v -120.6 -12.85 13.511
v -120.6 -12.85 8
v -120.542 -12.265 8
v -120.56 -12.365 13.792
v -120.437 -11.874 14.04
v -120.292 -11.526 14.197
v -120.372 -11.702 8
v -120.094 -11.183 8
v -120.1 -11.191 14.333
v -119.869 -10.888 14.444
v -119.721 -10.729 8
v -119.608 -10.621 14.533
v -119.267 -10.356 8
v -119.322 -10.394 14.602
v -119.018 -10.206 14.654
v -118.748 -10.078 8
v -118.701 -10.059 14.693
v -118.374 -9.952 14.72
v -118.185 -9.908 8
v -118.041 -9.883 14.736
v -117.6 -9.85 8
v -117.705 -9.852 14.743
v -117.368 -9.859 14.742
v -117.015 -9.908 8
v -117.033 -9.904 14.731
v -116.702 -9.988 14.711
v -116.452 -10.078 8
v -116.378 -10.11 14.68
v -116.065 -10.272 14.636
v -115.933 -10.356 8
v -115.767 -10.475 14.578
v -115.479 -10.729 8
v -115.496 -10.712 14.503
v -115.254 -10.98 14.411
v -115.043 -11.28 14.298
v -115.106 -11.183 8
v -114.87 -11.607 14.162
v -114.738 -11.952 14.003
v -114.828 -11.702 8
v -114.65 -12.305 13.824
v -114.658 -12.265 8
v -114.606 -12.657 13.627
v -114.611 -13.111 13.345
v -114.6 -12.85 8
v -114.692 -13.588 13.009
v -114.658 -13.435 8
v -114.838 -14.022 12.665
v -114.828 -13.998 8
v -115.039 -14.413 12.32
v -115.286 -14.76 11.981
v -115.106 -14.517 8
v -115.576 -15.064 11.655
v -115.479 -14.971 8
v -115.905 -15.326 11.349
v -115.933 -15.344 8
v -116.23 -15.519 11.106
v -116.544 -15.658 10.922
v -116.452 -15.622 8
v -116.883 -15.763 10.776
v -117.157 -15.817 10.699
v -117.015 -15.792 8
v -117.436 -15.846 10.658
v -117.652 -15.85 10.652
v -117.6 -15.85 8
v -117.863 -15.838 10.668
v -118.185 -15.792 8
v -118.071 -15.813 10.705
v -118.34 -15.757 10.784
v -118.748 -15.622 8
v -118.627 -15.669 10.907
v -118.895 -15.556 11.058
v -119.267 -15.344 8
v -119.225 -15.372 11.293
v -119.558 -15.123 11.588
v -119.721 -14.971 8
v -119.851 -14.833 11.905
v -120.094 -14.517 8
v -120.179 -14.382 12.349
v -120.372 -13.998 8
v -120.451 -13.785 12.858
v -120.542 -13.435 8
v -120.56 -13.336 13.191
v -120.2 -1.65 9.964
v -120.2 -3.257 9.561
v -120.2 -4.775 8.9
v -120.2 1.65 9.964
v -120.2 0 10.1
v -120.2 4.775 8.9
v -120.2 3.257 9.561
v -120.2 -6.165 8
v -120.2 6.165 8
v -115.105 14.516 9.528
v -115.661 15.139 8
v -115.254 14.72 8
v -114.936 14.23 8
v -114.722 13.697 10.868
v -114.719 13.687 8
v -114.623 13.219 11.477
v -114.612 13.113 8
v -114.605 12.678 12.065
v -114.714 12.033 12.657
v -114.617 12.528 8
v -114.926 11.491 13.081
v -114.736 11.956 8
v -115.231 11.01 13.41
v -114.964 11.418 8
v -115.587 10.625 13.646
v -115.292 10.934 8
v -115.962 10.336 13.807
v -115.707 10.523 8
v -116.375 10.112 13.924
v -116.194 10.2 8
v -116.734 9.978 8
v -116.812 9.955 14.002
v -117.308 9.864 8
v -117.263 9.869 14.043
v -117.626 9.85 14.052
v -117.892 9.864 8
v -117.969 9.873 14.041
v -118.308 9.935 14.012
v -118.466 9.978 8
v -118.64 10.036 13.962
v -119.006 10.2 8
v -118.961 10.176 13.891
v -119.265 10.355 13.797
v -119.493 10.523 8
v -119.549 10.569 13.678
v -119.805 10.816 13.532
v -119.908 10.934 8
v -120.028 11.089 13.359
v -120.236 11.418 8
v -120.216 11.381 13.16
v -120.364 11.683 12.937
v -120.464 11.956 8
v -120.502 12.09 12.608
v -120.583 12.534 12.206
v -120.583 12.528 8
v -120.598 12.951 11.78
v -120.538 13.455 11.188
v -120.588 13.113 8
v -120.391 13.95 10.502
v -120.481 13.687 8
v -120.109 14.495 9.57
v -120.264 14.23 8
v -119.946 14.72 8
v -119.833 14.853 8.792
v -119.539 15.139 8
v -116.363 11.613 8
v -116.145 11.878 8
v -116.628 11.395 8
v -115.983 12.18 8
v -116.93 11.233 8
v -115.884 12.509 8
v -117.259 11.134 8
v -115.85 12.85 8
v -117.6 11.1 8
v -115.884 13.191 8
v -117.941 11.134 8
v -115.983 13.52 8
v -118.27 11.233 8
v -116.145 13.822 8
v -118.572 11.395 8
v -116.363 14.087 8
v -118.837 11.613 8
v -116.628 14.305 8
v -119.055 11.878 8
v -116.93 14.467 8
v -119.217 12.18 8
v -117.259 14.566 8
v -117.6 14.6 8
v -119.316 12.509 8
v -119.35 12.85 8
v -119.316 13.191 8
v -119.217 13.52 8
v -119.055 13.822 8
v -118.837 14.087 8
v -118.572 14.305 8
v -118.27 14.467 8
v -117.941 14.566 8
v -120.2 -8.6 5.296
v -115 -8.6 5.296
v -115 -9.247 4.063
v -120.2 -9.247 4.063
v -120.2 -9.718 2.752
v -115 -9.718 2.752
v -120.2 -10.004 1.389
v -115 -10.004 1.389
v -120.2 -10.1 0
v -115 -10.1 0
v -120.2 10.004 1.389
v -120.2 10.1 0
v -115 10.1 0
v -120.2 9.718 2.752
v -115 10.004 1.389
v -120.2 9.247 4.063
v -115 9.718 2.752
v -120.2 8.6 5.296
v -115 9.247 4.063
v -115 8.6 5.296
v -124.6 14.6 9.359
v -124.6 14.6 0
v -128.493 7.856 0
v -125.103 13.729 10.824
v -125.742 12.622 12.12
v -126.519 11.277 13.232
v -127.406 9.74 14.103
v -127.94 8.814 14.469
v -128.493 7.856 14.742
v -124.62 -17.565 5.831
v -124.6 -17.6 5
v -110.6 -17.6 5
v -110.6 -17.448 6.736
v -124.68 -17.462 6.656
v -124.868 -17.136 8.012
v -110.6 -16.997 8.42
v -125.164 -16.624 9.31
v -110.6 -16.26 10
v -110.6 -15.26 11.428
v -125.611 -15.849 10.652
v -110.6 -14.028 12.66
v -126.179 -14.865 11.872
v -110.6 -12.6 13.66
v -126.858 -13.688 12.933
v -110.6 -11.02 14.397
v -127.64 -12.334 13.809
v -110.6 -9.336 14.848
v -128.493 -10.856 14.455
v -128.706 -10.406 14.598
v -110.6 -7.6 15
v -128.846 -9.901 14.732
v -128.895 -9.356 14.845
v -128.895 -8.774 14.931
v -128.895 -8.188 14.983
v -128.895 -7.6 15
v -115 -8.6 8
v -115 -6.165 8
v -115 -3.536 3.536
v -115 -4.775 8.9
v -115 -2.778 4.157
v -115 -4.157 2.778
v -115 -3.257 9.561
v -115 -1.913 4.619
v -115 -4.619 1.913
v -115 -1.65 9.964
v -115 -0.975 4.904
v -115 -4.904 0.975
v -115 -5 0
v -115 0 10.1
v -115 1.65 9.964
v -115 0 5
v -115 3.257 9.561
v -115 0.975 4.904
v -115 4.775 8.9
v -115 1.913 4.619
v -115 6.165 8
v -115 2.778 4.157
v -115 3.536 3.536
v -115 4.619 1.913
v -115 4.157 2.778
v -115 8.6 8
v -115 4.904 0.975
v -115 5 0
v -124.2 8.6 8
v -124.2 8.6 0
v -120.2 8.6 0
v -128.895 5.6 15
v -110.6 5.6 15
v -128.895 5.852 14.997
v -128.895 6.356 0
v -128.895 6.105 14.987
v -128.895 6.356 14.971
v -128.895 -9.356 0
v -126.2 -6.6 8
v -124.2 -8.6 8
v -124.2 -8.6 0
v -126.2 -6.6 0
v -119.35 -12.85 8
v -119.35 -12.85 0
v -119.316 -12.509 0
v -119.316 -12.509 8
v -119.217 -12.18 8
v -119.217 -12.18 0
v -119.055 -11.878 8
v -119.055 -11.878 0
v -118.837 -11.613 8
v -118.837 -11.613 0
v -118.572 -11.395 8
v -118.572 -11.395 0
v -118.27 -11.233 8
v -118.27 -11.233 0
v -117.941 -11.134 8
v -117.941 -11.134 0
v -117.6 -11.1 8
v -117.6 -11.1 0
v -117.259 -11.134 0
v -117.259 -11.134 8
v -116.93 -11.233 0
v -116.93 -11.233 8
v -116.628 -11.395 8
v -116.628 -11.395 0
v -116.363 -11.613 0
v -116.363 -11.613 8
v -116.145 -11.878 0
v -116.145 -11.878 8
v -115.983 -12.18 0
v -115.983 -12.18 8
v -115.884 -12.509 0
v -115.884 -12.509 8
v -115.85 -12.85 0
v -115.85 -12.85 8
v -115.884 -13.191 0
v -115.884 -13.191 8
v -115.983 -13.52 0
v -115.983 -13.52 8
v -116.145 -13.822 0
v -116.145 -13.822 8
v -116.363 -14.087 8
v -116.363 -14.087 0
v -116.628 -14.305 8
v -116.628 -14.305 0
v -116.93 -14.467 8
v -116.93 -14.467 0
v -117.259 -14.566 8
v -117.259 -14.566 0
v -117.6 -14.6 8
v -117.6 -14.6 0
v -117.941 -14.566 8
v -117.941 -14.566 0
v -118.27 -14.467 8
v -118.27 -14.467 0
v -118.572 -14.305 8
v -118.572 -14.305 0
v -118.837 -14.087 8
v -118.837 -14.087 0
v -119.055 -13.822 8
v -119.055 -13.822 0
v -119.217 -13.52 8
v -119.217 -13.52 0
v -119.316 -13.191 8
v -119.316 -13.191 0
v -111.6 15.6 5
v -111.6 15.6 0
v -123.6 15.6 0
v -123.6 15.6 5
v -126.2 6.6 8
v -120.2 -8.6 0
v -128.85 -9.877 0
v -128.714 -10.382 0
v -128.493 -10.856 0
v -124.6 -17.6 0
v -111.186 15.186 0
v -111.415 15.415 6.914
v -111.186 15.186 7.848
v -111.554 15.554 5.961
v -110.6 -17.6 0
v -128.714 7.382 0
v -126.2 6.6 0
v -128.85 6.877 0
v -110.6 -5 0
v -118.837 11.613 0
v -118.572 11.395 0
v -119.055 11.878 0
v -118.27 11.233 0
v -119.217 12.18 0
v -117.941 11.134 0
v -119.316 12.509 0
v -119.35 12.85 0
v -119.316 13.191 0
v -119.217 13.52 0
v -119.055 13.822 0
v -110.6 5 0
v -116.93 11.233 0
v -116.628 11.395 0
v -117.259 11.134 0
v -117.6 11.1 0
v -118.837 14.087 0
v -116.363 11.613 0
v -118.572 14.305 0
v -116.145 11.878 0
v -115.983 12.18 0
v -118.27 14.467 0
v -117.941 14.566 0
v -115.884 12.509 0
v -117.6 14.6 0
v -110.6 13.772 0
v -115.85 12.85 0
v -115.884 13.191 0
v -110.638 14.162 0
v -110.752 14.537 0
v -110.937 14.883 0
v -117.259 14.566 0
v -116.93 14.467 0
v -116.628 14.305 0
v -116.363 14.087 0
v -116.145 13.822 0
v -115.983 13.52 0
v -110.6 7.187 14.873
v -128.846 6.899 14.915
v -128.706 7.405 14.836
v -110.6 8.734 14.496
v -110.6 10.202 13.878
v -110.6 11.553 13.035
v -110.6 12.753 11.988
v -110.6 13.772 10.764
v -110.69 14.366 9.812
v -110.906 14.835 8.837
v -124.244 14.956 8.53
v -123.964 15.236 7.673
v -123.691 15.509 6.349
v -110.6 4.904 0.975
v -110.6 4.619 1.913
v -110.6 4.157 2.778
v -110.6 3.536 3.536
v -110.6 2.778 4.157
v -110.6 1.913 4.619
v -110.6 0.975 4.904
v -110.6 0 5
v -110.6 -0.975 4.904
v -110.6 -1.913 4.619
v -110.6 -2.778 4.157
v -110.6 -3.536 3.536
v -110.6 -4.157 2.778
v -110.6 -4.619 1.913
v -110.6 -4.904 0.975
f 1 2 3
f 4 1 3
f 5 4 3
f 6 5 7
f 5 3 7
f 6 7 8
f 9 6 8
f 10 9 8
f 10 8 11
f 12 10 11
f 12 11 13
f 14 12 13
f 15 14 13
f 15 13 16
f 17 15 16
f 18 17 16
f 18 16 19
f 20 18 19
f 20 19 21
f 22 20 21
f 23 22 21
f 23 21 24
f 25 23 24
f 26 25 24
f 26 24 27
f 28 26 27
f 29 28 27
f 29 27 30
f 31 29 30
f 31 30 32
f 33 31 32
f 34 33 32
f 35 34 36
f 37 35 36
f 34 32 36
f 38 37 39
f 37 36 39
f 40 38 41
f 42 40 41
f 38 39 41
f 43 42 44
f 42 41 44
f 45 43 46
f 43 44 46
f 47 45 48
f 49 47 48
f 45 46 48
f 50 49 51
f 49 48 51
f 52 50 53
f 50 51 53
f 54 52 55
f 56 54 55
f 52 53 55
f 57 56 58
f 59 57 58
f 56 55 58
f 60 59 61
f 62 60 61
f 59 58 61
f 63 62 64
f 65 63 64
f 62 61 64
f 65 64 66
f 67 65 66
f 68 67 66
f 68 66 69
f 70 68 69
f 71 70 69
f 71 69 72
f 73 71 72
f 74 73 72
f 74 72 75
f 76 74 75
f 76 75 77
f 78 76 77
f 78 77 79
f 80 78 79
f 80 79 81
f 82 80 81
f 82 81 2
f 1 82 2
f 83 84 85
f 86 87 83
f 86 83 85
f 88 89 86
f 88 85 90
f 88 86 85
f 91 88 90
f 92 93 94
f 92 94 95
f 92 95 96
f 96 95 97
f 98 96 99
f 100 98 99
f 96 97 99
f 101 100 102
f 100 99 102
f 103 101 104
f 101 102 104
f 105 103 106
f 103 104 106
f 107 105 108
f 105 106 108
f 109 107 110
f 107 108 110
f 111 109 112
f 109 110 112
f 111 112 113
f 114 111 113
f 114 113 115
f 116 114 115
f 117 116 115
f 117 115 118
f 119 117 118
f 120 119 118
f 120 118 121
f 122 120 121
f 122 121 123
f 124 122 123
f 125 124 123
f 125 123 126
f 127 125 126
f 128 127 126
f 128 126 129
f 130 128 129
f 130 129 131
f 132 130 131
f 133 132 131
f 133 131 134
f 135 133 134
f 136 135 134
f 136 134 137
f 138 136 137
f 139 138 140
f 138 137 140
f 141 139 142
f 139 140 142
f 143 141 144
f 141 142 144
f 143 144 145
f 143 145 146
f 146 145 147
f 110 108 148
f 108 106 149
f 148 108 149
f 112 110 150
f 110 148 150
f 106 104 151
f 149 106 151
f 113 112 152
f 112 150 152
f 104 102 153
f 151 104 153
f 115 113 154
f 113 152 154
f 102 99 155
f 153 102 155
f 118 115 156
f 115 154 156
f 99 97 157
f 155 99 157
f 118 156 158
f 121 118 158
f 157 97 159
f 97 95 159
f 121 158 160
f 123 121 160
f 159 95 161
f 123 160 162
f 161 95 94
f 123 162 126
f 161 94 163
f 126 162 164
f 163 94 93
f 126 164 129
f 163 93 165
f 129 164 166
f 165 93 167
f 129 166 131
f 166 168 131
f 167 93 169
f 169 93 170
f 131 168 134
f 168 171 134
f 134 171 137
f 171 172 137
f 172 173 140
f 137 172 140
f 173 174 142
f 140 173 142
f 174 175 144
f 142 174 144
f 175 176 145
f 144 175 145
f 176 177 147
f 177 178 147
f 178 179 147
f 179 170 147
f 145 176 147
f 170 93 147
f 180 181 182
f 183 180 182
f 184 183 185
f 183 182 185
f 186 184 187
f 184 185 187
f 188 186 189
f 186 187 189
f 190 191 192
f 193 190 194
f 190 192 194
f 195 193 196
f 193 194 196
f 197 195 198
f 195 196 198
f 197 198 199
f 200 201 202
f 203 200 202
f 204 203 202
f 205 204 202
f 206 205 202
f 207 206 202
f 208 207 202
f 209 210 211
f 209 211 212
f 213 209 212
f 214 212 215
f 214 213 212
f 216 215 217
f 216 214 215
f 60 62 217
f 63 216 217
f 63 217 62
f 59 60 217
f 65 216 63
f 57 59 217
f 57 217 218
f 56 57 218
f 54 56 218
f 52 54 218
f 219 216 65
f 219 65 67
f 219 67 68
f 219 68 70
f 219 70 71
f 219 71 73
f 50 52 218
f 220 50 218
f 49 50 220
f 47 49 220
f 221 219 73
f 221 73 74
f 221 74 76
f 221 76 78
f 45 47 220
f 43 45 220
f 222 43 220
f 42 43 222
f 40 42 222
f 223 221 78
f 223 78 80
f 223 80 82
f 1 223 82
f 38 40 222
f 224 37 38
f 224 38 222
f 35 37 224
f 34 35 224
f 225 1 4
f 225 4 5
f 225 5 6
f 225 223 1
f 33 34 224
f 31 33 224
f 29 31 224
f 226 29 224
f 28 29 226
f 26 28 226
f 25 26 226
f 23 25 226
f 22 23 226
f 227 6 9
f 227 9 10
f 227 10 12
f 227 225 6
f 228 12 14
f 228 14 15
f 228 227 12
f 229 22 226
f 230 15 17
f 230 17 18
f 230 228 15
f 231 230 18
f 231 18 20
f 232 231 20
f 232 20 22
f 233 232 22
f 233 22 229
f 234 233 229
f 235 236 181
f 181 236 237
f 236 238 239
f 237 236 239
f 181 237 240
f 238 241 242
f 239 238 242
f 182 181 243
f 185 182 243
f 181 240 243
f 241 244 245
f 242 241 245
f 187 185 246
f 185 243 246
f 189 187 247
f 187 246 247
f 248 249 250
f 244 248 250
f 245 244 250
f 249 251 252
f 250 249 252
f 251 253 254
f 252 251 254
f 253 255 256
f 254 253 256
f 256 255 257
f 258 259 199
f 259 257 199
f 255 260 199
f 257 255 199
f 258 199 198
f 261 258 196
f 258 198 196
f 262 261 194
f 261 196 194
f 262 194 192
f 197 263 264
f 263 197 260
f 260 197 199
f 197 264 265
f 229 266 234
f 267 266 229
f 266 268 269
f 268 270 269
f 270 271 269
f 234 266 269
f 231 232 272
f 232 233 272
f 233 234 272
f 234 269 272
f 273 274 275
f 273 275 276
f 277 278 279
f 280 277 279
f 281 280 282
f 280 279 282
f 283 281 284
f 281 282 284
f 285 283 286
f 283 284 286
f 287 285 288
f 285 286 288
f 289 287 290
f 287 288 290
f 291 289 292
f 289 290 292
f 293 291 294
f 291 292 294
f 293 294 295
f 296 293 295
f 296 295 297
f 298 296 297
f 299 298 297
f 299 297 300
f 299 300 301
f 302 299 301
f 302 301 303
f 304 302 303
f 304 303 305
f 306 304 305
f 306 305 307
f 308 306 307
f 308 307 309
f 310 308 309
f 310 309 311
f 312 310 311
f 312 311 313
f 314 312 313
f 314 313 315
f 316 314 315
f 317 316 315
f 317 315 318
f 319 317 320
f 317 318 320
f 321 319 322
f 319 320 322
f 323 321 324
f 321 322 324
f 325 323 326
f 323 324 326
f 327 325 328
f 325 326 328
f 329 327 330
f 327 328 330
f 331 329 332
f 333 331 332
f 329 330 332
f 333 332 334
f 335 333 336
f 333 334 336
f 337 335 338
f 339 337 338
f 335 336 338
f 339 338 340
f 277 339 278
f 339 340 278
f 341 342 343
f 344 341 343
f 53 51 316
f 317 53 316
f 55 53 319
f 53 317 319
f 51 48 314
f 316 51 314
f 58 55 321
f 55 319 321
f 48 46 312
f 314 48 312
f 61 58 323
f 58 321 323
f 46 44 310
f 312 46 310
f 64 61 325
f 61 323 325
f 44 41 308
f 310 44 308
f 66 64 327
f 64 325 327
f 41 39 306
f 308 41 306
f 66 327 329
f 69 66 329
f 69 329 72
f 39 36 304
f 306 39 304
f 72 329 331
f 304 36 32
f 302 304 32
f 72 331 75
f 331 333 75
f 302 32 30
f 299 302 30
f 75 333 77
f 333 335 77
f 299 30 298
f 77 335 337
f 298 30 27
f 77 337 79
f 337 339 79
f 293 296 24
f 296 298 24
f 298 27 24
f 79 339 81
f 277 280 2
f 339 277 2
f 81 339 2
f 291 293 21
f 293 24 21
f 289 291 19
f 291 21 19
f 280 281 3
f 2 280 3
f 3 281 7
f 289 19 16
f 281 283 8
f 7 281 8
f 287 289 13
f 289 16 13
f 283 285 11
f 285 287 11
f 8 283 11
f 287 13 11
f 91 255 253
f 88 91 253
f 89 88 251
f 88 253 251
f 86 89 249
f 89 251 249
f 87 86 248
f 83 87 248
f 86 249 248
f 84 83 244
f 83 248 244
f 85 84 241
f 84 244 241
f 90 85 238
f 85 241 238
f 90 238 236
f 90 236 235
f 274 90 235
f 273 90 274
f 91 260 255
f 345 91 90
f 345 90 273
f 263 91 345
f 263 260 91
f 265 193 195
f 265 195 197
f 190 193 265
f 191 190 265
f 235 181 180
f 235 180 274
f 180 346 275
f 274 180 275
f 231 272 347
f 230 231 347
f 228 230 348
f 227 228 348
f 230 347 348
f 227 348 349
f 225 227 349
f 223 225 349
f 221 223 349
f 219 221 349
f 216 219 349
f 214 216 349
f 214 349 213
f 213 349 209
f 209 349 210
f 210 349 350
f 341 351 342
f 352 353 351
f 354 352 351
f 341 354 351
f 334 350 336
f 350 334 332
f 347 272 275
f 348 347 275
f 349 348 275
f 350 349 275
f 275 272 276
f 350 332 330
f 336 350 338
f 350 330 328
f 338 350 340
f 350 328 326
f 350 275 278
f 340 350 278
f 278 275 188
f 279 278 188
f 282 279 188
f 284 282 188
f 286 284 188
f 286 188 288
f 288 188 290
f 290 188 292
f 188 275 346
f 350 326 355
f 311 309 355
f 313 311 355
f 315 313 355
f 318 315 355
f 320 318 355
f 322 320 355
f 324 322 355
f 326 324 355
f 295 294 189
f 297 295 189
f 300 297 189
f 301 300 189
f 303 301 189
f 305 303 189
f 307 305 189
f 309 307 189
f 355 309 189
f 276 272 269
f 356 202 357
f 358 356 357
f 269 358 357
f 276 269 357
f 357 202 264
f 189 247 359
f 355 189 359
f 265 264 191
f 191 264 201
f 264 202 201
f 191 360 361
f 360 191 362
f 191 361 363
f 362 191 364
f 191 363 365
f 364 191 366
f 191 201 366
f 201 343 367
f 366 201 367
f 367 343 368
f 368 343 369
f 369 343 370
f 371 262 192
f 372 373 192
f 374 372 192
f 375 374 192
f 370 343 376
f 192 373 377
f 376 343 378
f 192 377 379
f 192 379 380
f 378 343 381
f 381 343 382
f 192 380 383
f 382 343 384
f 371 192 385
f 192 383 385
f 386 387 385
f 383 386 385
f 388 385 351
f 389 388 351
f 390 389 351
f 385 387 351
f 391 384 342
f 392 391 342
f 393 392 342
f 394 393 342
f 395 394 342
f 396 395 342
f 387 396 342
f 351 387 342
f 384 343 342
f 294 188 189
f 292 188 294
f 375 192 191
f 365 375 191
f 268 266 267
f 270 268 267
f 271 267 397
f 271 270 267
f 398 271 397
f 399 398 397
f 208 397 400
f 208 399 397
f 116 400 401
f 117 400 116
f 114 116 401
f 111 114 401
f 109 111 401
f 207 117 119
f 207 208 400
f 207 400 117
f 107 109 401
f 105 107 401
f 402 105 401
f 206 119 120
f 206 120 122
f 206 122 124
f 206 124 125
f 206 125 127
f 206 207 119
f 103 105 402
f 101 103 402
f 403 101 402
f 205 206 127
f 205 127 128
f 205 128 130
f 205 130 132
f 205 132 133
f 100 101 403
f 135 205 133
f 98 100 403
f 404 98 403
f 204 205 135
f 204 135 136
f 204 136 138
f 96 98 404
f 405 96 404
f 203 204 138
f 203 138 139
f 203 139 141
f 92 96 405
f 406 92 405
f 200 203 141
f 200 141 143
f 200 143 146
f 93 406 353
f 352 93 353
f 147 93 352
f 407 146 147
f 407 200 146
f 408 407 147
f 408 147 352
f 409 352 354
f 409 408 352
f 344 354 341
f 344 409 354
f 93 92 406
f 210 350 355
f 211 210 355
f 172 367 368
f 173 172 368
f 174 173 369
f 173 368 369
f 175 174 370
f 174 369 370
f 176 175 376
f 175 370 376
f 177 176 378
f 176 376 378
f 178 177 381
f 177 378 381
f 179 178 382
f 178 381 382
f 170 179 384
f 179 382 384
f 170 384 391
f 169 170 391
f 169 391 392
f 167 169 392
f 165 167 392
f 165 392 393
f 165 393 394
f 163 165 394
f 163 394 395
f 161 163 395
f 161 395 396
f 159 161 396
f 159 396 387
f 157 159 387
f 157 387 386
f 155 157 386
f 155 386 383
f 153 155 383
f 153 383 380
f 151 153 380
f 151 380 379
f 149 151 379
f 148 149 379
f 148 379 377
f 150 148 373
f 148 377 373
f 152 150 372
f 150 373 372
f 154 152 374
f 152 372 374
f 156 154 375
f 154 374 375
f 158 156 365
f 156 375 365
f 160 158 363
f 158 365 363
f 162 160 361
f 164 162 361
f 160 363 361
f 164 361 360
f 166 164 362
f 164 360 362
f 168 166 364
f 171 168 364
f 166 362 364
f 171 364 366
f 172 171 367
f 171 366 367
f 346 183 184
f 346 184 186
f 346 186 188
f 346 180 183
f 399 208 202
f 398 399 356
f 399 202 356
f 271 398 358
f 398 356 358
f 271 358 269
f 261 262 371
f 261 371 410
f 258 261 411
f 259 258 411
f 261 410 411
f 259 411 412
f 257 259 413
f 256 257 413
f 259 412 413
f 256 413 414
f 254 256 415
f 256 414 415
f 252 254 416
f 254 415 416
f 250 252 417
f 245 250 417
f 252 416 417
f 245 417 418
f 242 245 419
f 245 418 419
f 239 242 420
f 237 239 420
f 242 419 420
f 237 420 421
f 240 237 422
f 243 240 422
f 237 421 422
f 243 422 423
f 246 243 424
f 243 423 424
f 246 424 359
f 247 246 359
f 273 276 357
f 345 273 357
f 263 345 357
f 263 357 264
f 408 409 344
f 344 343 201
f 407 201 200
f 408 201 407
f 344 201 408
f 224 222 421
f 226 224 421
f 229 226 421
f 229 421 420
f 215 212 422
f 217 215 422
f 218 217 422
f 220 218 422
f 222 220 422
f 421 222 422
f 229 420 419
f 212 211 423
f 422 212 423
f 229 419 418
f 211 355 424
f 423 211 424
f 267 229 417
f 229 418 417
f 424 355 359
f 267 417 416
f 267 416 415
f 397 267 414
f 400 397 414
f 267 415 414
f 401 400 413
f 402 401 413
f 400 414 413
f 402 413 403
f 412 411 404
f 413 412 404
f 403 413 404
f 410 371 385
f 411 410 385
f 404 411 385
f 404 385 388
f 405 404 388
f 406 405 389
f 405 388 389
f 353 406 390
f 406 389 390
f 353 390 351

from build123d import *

# Parameters (mm, degrees)
BOSS_EXTRUDE1_DEPTH = 15
SKETCH3_R           = 5
CUT_EXTRUDE1_DEPTH  = 13
CUT_EXTRUDE2_START  = -7
SKETCH4_R           = 10.1
CUT_EXTRUDE2_DEPTH  = 2.6
SKETCH5_R           = 1.75
CUT_EXTRUDE3_DEPTH  = 131.953306572
CUT_EXTRUDE4_START  = -8
SKETCH6_R           = 3
CUT_EXTRUDE4_DEPTH  = 123.953306572
FILLET1_START       = -130
FILLET1_DEPTH       = 19.4
CUT_EXTRUDE5_DEPTH  = 8


with BuildPart() as part:
    # Sketch1 → Boss-Extrude1 (new body)
    with BuildSketch(Plane.XY):
        with BuildLine():
            Line((-124.6, 14.6), (-128.493415545, 7.856406461))
            ThreePointArc((-128.493415545, 7.856406461), (-128.793116813, 7.132863596), (-128.895339334, 6.356406461))
            Line((-128.895339334, 6.356406461), (-128.895339334, -9.356406461))
            ThreePointArc((-128.895339334, -9.356406461), (-128.793116813, -10.132863596), (-128.493415545, -10.856406461))
            Line((-128.493415545, -10.856406461), (-124.6, -17.6))
            Line((-124.6, -17.6), (-110.6, -17.6))
            Line((-110.6, -17.6), (-110.6, -5))
            Line((-110.6, -5), (-110.6, 5))
            Line((-110.6, 5), (-110.6, 13.771572875))
            ThreePointArc((-110.6, 13.771572875), (-110.752240935, 14.53693974), (-111.185786438, 15.185786438))
            Line((-111.185786438, 15.185786438), (-111.6, 15.6))
            Line((-111.6, 15.6), (-123.6, 15.6))
            Line((-123.6, 15.6), (-124.6, 14.6))
        make_face()
    extrude(amount=BOSS_EXTRUDE1_DEPTH)

    # Sketch3 → Cut-Extrude1 (cut)
    with BuildSketch(Plane(origin=(-110.6, 0, 0), x_dir=(0, 0, -1), z_dir=(1, 0, 0))):
        Circle(SKETCH3_R)
    extrude(amount=-CUT_EXTRUDE1_DEPTH, mode=Mode.SUBTRACT)

    # Sketch4 → Cut-Extrude2 (cut, symmetric)
    with BuildSketch(Plane(origin=(-110.6, 0, 0), x_dir=(0, 0, -1), z_dir=(1, 0, 0)).offset(CUT_EXTRUDE2_START)):
        Circle(SKETCH4_R)
    extrude(amount=CUT_EXTRUDE2_DEPTH, both=True, mode=Mode.SUBTRACT)

    # Sketch5 → Cut-Extrude3 (cut, through all)
    with BuildSketch(Plane(origin=(0, 0, 0), x_dir=(-1, 0, 0), z_dir=(0, 0, -1))):
        with Locations((117.6, 12.85)):
            Circle(SKETCH5_R)
        with Locations((117.6, -12.85)):
            Circle(SKETCH5_R)
    extrude(amount=-CUT_EXTRUDE3_DEPTH, mode=Mode.SUBTRACT)

    # Sketch6 → Cut-Extrude4 (cut, through all)
    with BuildSketch(Plane(origin=(0, 0, 0), x_dir=(-1, 0, 0), z_dir=(0, 0, -1)).offset(CUT_EXTRUDE4_START)):
        with Locations((117.6, 12.85)):
            Circle(SKETCH6_R)
        with Locations((117.6, -12.85)):
            Circle(SKETCH6_R)
    extrude(amount=-CUT_EXTRUDE4_DEPTH, mode=Mode.SUBTRACT)

    # Fillet1: read off the stored shape, not the designer's step
    # Fillet1 outline → Fillet1 (cut)
    with BuildSketch(Plane.YZ.offset(FILLET1_START)):
        with BuildLine():
            ThreePointArc((-17.6, 5), (-14.671067812, 12.071067812), (-7.6, 15))
            Line((-7.6, 15), (-17.6, 15))
            Line((-17.6, 15), (-17.6, 5))
        make_face()
        with BuildLine():
            ThreePointArc((5.6, 15), (12.671067812, 12.071067812), (15.6, 5))
            Line((15.6, 5), (15.6, 15))
            Line((15.6, 15), (5.6, 15))
        make_face()
    extrude(amount=FILLET1_DEPTH, mode=Mode.SUBTRACT)

    # Sketch7 → Cut-Extrude5 (cut)
    with BuildSketch(Plane(origin=(0, 0, 0), x_dir=(-1, 0, 0), z_dir=(0, 0, -1))):
        Polygon((115, -8.6), (124.2, -8.6), (126.2, -6.6), (126.2, 6.6), (124.2, 8.6), (115, 8.6), align=None)
    extrude(amount=-CUT_EXTRUDE5_DEPTH, mode=Mode.SUBTRACT)


solid = part.part
